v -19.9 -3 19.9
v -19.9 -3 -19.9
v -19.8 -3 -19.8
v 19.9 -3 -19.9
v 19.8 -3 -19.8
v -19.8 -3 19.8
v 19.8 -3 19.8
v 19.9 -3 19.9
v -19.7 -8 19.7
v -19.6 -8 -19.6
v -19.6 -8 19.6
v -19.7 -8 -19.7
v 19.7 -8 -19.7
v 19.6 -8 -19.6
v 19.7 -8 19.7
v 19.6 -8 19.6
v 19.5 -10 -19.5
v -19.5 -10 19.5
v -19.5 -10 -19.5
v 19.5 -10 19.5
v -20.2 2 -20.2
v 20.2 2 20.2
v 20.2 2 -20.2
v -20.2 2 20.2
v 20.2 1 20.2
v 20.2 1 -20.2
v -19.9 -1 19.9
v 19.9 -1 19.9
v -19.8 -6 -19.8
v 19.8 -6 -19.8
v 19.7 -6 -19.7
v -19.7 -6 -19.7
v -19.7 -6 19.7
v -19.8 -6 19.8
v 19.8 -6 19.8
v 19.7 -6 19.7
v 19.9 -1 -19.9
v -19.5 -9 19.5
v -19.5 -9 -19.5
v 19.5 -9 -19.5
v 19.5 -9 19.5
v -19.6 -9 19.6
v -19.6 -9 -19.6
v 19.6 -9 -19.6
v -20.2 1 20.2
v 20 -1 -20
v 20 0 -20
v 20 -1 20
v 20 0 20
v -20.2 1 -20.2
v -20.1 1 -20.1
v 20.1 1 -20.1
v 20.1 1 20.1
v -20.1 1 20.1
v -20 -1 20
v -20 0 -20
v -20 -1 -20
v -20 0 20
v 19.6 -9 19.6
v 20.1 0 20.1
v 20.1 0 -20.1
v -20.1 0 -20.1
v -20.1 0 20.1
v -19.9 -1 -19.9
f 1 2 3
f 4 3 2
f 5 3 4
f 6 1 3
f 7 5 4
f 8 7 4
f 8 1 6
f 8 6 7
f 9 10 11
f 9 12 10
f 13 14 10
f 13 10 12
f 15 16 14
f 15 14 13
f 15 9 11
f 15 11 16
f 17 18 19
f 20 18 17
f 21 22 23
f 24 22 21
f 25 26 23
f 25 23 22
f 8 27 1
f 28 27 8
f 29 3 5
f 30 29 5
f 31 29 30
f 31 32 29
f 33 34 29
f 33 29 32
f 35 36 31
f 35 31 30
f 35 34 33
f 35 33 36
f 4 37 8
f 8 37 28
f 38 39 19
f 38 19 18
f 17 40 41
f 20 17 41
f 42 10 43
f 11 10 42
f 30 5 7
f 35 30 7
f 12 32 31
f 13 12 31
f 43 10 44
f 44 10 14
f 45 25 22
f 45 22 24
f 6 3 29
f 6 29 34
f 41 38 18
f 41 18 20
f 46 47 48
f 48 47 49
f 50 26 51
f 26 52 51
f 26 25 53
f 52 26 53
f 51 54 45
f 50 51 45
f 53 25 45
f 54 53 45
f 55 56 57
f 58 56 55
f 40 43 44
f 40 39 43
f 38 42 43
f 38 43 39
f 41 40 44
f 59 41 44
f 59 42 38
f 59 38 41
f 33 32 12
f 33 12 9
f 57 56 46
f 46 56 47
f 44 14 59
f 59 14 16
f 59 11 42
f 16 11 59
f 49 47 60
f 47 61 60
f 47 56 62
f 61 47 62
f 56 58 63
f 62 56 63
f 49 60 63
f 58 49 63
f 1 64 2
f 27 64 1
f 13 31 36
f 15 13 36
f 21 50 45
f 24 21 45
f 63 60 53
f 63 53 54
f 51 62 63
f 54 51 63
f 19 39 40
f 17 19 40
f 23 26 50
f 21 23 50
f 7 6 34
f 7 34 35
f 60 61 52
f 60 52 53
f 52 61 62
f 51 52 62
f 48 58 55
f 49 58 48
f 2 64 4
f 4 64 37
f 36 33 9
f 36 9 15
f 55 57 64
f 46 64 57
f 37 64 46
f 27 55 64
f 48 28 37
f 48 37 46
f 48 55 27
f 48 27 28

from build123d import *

# Parameters (mm, degrees)
F0_W      = 40
F0_H      = 40
F1_DEPTH  = 1
F2_W      = 39.8
F2_H      = 39.8
F3_DEPTH  = 2
F4_W      = 39.6
F4_H      = 39.6
F5_DEPTH  = 3
F6_W      = 39.4
F6_H      = 39.4
F7_DEPTH  = 1
F8_W      = 39.4
F8_H      = 39.4
F9_DEPTH  = 1
F10_W     = 39.2
F10_H     = 39.2
F11_DEPTH = 1
F12_W     = 39
F12_H     = 39
F13_DEPTH = 1
F14_W     = 40.2
F14_H     = 40.2
F15_DEPTH = 1
F16_W     = 40.4
F16_H     = 40.4
F17_DEPTH = 1


with BuildPart() as f1:
    # F0 (on Front) → F1 (new body)
    with BuildSketch(Plane.XZ):
        Rectangle(F0_W, F0_H)
    extrude(amount=F1_DEPTH)

    # F2 (on face) → F3 (join)
    with BuildSketch(Plane.XZ.offset(1)):
        Rectangle(F2_W, F2_H)
    extrude(amount=F3_DEPTH)

    # F4 (on face) → F5 (join)
    with BuildSketch(Plane.XZ.offset(3)):
        Rectangle(F4_W, F4_H)
    extrude(amount=F5_DEPTH)



with BuildPart() as f7:
    # F6 (on face) → F7 (new body)
    with BuildSketch(Plane.XZ.offset(7)):
        Rectangle(F6_W, F6_H)
    extrude(amount=F7_DEPTH)


with BuildPart() as f1_1:
    add(f1.part)

    add(f7.part)  # F9 merges F7
    # F8 (on face) → F9 (join)
    with BuildSketch(Plane.XZ.offset(6)):
        Rectangle(F8_W, F8_H)
    extrude(amount=F9_DEPTH)

    # F10 (on face) → F11 (join)
    with BuildSketch(Plane.XZ.offset(8)):
        Rectangle(F10_W, F10_H)
    extrude(amount=F11_DEPTH)

    # F12 (on face) → F13 (join)
    with BuildSketch(Plane.XZ.offset(9)):
        Rectangle(F12_W, F12_H)
    extrude(amount=F13_DEPTH)

    # F14 (on face) → F15 (join)
    with BuildSketch(Plane(origin=(0, 0, 0), x_dir=(-1, 0, 0), z_dir=(0, 1, 0))):
        Rectangle(F14_W, F14_H)
    extrude(amount=F15_DEPTH)

    # F16 (on face) → F17 (join)
    with BuildSketch(Plane(origin=(0, 1, 0), x_dir=(-1, 0, 0), z_dir=(0, 1, 0))):
        Rectangle(F16_W, F16_H)
    extrude(amount=F17_DEPTH)


solid = f1_1.part
